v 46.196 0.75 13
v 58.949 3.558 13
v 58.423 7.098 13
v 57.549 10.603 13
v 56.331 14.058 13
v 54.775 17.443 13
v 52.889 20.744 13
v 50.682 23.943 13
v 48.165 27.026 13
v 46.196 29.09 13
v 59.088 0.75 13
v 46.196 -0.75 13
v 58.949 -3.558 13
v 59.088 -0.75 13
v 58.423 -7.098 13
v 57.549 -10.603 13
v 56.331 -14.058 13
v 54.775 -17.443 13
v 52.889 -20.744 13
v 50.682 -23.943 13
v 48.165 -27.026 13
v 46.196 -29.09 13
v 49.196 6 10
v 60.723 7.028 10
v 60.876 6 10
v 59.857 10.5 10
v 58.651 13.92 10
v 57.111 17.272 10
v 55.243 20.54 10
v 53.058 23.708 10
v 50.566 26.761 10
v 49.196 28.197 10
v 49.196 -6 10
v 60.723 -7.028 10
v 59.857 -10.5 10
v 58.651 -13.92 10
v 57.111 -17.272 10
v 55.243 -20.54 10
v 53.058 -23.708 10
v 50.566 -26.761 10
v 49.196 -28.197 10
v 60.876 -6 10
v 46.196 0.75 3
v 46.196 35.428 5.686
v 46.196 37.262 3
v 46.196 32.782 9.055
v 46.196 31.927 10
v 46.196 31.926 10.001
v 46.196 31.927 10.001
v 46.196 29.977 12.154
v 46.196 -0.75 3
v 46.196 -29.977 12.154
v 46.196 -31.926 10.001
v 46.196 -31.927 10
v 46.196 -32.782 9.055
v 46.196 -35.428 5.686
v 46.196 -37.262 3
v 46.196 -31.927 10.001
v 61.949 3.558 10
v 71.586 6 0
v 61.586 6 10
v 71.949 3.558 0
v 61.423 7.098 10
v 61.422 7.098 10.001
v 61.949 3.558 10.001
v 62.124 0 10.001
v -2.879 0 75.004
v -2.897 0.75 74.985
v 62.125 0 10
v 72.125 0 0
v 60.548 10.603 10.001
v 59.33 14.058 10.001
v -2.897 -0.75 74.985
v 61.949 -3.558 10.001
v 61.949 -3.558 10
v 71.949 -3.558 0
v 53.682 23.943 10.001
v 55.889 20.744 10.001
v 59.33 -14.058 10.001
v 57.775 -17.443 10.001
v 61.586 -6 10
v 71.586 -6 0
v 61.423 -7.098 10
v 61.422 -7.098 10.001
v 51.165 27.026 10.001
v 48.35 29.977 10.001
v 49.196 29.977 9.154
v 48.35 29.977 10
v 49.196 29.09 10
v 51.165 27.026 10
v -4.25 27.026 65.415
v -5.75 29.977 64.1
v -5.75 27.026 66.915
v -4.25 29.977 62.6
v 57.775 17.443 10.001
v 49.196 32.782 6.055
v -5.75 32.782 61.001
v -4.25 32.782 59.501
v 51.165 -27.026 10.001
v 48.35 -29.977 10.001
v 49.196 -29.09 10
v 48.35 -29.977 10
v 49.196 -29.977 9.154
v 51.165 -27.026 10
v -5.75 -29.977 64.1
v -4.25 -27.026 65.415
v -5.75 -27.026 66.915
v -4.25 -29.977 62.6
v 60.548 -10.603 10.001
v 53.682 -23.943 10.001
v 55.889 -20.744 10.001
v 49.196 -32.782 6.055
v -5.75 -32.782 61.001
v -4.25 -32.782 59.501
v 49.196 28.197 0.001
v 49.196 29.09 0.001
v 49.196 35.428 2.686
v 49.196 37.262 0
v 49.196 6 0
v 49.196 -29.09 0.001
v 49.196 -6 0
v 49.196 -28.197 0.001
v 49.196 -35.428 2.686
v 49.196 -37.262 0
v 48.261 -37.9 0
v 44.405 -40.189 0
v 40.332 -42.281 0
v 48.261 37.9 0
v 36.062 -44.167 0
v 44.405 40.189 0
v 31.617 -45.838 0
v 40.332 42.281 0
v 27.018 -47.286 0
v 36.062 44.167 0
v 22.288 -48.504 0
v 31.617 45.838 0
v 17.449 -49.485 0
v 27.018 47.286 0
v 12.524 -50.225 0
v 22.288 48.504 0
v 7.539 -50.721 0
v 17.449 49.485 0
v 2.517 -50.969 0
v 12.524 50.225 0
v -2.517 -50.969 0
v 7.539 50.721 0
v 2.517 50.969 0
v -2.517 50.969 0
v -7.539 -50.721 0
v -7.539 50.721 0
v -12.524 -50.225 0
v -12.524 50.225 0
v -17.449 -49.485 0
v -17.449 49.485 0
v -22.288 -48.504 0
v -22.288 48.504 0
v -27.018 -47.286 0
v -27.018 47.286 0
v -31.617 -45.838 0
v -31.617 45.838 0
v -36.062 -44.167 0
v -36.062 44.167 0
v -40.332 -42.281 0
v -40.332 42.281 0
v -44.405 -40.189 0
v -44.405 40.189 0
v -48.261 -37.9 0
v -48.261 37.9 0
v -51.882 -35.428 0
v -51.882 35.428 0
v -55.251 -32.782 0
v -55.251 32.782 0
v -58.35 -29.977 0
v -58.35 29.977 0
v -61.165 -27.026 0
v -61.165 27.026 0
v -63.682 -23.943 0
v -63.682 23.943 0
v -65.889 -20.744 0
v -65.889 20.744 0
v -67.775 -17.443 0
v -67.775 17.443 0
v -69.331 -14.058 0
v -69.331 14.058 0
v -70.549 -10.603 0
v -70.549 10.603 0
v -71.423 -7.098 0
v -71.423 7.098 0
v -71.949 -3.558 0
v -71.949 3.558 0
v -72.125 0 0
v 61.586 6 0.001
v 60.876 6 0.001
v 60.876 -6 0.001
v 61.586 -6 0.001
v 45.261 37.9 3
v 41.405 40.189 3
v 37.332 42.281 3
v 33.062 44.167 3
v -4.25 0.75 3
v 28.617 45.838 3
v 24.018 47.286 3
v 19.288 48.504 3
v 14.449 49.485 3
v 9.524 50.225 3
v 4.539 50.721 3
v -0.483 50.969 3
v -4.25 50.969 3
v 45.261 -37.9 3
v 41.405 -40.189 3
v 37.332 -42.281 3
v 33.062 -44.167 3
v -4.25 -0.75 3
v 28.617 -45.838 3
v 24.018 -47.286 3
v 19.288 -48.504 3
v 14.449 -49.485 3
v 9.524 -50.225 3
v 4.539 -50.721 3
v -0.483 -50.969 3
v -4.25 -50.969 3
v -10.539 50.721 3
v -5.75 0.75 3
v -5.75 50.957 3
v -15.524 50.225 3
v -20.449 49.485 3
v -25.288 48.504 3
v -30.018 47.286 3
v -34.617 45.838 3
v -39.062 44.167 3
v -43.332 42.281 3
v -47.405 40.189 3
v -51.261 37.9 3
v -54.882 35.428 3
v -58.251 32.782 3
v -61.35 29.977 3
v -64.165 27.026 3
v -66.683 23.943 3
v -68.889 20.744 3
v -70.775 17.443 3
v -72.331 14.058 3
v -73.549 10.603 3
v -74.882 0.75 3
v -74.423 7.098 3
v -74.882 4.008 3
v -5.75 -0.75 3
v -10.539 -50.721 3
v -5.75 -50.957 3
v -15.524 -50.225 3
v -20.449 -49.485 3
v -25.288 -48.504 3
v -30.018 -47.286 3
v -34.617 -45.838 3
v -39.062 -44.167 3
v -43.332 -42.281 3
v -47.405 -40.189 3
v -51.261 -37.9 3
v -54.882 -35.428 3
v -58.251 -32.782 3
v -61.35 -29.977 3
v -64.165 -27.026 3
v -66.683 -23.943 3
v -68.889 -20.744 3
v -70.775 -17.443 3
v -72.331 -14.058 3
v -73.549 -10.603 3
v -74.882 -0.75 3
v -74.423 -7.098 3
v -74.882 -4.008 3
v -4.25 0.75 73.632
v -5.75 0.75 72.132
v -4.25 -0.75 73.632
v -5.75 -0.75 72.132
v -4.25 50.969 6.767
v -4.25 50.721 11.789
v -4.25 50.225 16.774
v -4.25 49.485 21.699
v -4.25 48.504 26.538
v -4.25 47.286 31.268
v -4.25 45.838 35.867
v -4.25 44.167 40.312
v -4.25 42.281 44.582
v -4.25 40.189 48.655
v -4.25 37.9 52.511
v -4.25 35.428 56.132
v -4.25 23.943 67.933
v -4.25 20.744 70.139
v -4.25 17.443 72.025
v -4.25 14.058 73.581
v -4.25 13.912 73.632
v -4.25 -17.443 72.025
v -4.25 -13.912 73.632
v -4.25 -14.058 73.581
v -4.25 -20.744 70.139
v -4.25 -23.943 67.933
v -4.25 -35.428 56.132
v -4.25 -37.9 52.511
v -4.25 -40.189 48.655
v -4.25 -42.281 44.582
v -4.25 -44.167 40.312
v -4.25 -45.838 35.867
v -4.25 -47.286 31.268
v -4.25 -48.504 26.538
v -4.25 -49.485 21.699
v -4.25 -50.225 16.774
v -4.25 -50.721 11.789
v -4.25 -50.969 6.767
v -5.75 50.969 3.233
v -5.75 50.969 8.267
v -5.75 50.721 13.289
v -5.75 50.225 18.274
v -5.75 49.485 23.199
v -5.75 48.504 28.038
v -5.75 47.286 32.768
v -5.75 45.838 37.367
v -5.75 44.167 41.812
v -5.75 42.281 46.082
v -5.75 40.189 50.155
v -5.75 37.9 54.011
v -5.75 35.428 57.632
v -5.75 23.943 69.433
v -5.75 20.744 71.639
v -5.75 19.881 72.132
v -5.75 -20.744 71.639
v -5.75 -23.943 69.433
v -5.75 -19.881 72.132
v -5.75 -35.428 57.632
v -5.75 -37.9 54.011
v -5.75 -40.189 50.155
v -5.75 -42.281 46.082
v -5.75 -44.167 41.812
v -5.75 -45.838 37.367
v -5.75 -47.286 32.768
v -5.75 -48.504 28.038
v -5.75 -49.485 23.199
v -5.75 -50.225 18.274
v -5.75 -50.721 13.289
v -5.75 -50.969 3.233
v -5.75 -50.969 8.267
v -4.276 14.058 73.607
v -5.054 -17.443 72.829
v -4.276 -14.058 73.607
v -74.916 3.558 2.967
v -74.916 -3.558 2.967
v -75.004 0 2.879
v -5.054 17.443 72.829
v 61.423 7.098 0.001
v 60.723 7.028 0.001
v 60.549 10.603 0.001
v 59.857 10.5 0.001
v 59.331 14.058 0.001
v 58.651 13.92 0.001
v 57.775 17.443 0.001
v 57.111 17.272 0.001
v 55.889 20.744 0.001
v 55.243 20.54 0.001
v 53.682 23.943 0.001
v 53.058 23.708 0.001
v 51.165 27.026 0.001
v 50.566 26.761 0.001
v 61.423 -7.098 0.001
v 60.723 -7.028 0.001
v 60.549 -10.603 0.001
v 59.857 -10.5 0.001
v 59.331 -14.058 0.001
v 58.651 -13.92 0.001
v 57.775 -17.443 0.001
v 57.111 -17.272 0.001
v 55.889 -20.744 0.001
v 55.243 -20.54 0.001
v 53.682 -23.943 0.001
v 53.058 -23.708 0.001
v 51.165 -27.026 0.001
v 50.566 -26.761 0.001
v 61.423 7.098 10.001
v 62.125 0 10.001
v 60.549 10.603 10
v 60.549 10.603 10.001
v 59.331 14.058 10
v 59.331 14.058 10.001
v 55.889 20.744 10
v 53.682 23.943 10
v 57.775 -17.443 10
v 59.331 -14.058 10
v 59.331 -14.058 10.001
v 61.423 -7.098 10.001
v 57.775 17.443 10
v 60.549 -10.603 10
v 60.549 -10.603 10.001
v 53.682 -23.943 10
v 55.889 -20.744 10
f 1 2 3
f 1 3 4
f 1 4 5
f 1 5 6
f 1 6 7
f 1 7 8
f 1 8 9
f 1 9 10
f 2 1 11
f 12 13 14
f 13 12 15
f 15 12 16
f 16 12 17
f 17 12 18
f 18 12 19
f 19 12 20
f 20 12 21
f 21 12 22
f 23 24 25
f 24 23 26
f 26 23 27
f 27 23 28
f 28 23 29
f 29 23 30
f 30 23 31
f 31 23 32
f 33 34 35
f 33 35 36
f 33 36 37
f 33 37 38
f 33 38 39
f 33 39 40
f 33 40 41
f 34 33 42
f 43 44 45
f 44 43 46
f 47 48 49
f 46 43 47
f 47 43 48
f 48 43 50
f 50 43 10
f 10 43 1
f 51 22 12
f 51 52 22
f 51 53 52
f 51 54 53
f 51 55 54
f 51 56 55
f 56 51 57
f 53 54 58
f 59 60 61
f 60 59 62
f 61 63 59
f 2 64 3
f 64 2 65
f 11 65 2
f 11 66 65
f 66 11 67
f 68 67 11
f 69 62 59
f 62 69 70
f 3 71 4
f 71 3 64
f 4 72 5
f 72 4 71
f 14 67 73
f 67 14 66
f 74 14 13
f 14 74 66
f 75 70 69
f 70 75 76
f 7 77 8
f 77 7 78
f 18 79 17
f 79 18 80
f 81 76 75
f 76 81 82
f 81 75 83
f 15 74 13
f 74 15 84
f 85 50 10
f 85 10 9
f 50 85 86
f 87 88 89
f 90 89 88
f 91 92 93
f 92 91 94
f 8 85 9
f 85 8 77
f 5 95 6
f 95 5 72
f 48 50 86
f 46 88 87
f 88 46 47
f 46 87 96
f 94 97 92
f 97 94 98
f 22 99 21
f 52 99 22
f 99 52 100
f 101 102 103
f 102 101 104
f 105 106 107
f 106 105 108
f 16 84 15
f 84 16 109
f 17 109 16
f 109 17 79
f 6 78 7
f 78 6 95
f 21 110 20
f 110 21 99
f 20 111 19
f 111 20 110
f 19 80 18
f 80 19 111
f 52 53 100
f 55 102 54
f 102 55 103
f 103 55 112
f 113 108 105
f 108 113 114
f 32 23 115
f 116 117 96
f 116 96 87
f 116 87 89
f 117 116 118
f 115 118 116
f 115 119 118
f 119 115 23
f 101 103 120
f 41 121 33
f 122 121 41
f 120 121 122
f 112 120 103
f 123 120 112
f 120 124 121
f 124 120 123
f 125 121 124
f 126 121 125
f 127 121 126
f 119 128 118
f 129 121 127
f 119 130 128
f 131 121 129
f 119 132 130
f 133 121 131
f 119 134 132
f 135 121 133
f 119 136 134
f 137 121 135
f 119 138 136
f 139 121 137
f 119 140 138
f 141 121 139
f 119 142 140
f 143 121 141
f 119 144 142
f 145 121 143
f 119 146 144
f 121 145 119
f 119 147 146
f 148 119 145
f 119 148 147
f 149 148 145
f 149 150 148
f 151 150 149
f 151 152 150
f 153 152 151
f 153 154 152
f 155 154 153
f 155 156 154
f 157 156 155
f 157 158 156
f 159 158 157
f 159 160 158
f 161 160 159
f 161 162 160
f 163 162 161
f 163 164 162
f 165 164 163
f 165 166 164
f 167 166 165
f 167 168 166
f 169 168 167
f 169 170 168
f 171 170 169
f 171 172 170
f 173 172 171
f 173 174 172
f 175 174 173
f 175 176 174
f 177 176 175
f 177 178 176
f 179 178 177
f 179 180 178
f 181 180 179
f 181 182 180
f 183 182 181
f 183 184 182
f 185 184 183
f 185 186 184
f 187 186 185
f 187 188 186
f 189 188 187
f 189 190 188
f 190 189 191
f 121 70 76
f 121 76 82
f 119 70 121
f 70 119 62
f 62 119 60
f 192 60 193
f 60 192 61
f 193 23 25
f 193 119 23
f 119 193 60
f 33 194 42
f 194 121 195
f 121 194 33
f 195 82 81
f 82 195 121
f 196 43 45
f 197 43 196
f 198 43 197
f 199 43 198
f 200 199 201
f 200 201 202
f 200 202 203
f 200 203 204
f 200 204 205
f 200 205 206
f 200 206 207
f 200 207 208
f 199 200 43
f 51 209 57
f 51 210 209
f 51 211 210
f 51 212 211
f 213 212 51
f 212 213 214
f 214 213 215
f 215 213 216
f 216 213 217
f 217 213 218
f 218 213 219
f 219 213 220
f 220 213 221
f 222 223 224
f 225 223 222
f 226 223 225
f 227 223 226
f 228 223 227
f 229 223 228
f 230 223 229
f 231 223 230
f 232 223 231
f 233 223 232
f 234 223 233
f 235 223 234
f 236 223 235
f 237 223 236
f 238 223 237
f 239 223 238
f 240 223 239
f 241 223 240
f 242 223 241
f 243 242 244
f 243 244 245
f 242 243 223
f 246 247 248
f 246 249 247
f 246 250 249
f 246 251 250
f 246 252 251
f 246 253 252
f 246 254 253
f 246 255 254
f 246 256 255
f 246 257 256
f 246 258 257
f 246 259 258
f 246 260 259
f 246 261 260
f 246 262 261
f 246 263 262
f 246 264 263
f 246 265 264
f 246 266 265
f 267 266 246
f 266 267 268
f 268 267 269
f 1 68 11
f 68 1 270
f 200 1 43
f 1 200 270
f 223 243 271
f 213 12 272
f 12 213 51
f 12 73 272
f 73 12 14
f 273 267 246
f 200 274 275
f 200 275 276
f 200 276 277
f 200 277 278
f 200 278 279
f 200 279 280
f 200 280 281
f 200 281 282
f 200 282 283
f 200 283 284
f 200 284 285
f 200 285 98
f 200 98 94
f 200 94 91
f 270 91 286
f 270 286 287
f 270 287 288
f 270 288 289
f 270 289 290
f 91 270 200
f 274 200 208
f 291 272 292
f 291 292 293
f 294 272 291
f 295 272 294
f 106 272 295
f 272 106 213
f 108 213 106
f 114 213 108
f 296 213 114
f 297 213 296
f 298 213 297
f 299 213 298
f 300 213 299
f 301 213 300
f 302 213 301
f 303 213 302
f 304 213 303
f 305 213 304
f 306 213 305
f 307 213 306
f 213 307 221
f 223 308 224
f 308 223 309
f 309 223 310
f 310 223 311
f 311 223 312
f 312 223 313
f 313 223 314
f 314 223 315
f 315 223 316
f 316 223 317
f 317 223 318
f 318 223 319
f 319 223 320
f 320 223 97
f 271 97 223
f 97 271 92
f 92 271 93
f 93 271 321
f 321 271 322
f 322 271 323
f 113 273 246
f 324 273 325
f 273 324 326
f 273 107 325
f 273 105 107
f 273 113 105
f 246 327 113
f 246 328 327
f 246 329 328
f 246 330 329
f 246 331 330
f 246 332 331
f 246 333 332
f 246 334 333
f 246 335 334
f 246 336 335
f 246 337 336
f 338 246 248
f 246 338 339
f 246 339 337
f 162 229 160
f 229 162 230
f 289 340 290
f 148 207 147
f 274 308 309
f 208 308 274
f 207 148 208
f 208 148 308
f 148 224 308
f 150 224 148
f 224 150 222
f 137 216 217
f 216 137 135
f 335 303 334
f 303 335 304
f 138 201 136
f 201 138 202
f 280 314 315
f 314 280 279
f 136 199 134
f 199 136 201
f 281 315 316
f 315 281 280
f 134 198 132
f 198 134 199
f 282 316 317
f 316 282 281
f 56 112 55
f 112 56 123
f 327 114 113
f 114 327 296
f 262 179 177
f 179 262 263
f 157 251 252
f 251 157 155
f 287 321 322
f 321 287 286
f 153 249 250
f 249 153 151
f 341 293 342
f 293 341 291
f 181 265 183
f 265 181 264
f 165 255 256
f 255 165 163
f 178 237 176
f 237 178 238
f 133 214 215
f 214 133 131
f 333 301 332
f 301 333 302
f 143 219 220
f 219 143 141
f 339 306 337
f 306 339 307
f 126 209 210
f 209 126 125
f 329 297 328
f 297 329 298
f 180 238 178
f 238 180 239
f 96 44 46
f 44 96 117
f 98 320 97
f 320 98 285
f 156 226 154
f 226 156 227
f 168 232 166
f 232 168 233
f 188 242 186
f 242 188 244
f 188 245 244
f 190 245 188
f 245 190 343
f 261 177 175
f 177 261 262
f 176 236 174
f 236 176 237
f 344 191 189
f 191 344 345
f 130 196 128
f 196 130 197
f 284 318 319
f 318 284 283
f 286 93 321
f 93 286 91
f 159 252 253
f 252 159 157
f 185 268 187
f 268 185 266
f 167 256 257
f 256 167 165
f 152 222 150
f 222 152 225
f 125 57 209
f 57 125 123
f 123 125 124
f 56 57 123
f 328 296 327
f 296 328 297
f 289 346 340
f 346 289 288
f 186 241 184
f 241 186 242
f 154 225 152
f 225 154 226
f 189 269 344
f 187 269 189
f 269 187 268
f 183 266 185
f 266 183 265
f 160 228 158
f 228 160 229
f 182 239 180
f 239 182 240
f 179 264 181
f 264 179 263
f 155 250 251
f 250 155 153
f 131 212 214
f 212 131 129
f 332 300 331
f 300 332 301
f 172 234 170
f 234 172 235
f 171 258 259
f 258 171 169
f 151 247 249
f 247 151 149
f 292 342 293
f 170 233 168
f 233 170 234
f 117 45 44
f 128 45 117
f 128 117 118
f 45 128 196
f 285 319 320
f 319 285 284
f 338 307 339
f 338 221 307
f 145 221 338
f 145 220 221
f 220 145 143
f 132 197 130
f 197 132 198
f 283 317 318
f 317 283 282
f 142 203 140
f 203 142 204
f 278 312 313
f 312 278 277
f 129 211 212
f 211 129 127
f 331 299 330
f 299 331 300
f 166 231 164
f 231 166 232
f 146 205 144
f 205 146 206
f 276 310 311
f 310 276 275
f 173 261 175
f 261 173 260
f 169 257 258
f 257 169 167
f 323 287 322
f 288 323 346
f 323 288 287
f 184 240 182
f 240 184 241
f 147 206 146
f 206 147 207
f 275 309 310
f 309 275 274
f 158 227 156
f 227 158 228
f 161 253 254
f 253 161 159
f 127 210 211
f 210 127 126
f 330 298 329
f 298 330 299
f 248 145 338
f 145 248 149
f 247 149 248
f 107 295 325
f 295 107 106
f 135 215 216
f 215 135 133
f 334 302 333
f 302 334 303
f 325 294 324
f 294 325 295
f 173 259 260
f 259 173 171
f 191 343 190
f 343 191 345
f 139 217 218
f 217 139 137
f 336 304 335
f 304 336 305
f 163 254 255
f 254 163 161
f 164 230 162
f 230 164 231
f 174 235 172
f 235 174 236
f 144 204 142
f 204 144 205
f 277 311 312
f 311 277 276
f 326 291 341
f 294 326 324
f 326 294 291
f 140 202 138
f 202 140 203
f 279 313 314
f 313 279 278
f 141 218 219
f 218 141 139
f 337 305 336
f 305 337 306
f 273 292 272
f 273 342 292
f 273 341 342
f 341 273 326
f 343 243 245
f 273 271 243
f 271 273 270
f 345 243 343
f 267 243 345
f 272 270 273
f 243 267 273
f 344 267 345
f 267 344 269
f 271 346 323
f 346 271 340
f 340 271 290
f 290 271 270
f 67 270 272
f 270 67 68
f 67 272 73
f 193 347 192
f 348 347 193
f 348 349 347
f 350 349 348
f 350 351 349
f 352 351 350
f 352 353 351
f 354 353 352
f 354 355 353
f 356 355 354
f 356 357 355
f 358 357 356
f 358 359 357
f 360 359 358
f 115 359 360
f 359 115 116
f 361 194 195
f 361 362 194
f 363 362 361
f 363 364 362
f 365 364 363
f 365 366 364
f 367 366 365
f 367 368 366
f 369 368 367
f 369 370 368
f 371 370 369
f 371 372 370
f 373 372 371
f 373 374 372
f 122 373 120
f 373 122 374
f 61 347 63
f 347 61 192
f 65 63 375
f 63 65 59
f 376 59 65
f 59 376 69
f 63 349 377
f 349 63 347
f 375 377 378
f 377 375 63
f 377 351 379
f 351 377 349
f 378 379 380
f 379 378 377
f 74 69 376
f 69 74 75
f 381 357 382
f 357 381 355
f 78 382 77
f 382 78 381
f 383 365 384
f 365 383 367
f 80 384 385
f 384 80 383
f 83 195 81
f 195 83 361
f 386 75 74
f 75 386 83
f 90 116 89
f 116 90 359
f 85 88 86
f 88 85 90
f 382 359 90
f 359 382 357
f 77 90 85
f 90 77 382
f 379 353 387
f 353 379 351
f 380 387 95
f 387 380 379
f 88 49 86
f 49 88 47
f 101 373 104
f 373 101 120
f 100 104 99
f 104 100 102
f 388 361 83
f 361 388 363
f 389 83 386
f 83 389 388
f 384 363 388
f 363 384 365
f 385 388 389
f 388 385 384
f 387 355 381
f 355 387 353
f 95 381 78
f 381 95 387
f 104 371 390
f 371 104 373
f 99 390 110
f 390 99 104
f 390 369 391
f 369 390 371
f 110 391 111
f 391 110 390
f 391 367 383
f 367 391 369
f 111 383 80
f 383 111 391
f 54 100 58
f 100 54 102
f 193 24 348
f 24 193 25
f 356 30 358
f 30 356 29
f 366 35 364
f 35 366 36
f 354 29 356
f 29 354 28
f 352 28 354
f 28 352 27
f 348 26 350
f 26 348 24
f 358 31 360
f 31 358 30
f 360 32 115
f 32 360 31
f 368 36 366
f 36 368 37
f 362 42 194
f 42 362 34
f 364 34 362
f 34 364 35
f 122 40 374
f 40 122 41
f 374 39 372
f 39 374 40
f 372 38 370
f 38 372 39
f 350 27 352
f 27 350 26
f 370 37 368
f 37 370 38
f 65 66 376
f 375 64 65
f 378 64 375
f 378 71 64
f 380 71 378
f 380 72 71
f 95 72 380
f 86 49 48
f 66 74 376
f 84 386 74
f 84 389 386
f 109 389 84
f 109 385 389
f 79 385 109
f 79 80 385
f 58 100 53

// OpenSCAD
// file: parts.scad
include <definitions.scad>
elevation =  BASE_MIN_THICKNESS + PIPE_DIAMETER_INNER/2 + PIPE_MARGIN - WALL_THICKNESS;

module diagonal_end_rest_raw(thin=false) {
    translate([0, 0, elevation])
    rotate([0, 45, 0]) {
        // bottom-most wall, shorter to create rest
        translate([0, 0, -REST_HEIGHT/2])
        difference() {
            // wall, full surface, creating rest top
            thickness = thin ? 0.5 : WALL_THICKNESS;
            dz = REST_HEIGHT + thickness/2;
            translate([-dz, 0, dz])
            cube([PIPE_DIAMETER_INNER* S2 *2, PIPE_DIAMETER_INNER, thickness], true);

            translate([-REST_LENGTH-WALL_THICKNESS, 0, REST_HEIGHT])
            cube([PIPE_DIAMETER_INNER* S2 + REST_HEIGHT*S2, PIPE_DIAMETER_INNER+ATOM*2, REST_HEIGHT+WALL_THICKNESS], true);
        }
    }
}

module diagonal_end_rest(thin=false, recessed=false) {
    intersection() {
        radius = PIPE_DIAMETER_INNER/2 - (recessed ? 0.5 : 0);
        diagonal_end_rest_raw(thin);
        barrel(radius, 0, PIPE_HEIGHT);
    }
}

module diagonal_end_raw() {
    translate([0, 0, elevation])
    rotate([0, 45, 0]) {
        //
        // bottom-most wall, shorter to create rest
        //
        difference() {
            union() {
                translate([-REST_LENGTH, 0, 0])
                cube([PIPE_DIAMETER_INNER* S2 + REST_HEIGHT*S2, PIPE_DIAMETER_INNER, REST_HEIGHT], true);
                // cable grove
                cube([PIPE_DIAMETER_INNER* S2 + REST_HEIGHT*S2, PLUG_GROVE_WIDTH, REST_HEIGHT], true);   
            }
            translate([-REST_LENGTH-WALL_THICKNESS, 0, WALL_THICKNESS*1.5])
            cube([PIPE_DIAMETER_INNER* S2 + REST_HEIGHT*S2, PIPE_DIAMETER_INNER, REST_HEIGHT+WALL_THICKNESS], true);
        }

        // long foot
        h = PIPE_DIAMETER_INNER * 2;
        translate([0, 0, h/2 - REST_HEIGHT/2])
        cube ([PIPE_DIAMETER_INNER* S2*S2, WALL_THIN_THICKNESS, h], true);
        
        // short foot
        translate([0, 0, PIPE_DIAMETER_INNER/2 - REST_HEIGHT/2])
        cube ([WALL_THIN_THICKNESS, PIPE_DIAMETER_INNER, PIPE_DIAMETER_INNER], true);
    }
}

module diagonal_end(flat=false) {
    sink = flat ? -elevation + REST_HEIGHT / S2 : 0;
    rot = flat ? -45 : 0;
    
    rotate([0, rot, 0])
    translate([0, 0, sink])
    {
        diagonal_end_rest();
        intersection() {
            diagonal_end_raw();
            barrel(PIPE_DIAMETER_INNER/2, 0, PIPE_HEIGHT);
        }
    }
}

module diagonal_end_rest_border() {
    sink = -elevation + REST_HEIGHT / S2;
    rot = -45;
    
    rotate([0, rot, 0])
    translate([0, 0, sink]) {
        difference() {
            diagonal_end_rest(thin=true);
            diagonal_end_rest(thin=true, recessed=true);
        }
    }
}


module perpendicular_end_raw(recess) {
    translate([0, 0, CABLE_GROVE_HEIGHT/2 + PIPE_MARGIN/2])
    trapezoid ([PIPE_DIAMETER_OUTER, CABLE_GROVE_WIDTH-recess*2, CABLE_GROVE_HEIGHT + PIPE_MARGIN], true);

    translate([-CAVITY_SHORTAGE/2, 0, CAVITY_HEIGHT/2 + PIPE_MARGIN/2])
    trapezoid ([PIPE_DIAMETER_INNER-CAVITY_SHORTAGE, CAVITY_WIDTH-recess*2, CAVITY_HEIGHT + PIPE_MARGIN], true);

    if (!recess) {
        // marks
        translate([0, 0, PIPE_MARGIN/2])
        trapezoid ([PIPE_DIAMETER_OUTER, CABLE_GROVE_WIDTH+MARK_THICKNESS*2-recess*2, PIPE_MARGIN], true);

        translate([-CAVITY_SHORTAGE/2, 0, PIPE_MARGIN/2])
        trapezoid ([PIPE_DIAMETER_INNER-CAVITY_SHORTAGE, CAVITY_WIDTH+MARK_THICKNESS*2-recess*2, PIPE_MARGIN], true);
        
        // strut
        strut_height = WALL_THICKNESS;
        translate([0, 0, strut_height/2])
        cube ([WALL_THICKNESS, PIPE_DIAMETER_INNER, strut_height], true); 
    }
}

module perpendicular_end_stop() {
    translate([0, 0, -STOP_THICKNESS/2])
    cube ([PIPE_DIAMETER_OUTER, CABLE_GROVE_WIDTH+MARK_THICKNESS*2, STOP_THICKNESS], true);

    translate([-CAVITY_SHORTAGE/2 -PIPE_THICKNESS/2, 0, -STOP_THICKNESS/2])
    cube ([PIPE_DIAMETER_OUTER-PIPE_THICKNESS-CAVITY_SHORTAGE, CAVITY_WIDTH+MARK_THICKNESS*2, STOP_THICKNESS], true);
    
    translate([0, 0, -STOP_THICKNESS/2])
    cube ([WALL_THICKNESS, PIPE_DIAMETER_OUTER, STOP_THICKNESS], true); 
}

module perpendicular_end(flat=false) {
    translate([0, 0, flat ? STOP_THICKNESS : 0])
    {
        intersection() {
             difference(){
                perpendicular_end_raw(0);
                 translate([-WALL_THIN_THICKNESS, 0, -WALL_THIN_THICKNESS])
                perpendicular_end_raw(WALL_THIN_THICKNESS);
            }
            barrel(PIPE_DIAMETER_INNER/2, 0, PIPE_HEIGHT);
        }
        perpendicular_end_stop();
    }
}

perpendicular_end();
diagonal_end();
%barrel(PIPE_DIAMETER_OUTER/2, PIPE_DIAMETER_INNER/2, PIPE_HEIGHT);
// file: definitions.scad
S2 = sqrt(2);
ATOM = 0.001;

PIPE_THICKNESS = 2.5;
PIPE_DIAMETER_INNER = 102;
PIPE_DIAMETER_OUTER = PIPE_DIAMETER_INNER + 2 * PIPE_THICKNESS;
PIPE_MARGIN = 10;
PIPE_HEIGHT = 131; // please manually adjust

WALL_THICKNESS = 3;
WALL_THIN_THICKNESS = 1.5;
REST_HEIGHT = 10;
REST_LENGTH = 25;
BASE_MIN_THICKNESS = 25;
PLUG_GROVE_WIDTH = 12;
CABLE_GROVE_WIDTH = 7;
CABLE_GROVE_HEIGHT = 5;

CAVITY_WIDTH = 20;
CAVITY_SHORTAGE = 35;
CAVITY_HEIGHT = 30;
MARK_THICKNESS = 0.5;
STOP_THICKNESS = 2;

SUPPORT_THICKNESS = 0.5;

$fn = 90;

module barrel(outer_radius, inner_radius, height) {
    scale([1, 1, height])
    difference() {
        cylinder(r=outer_radius);
        if (inner_radius)
            translate([0, 0, -0.5]) scale([1, 1, 2])
            cylinder(r=inner_radius);
    }
}

module trapezoid(size, center) {
//    cube(size, center);
    x = size[0];
    y = size[1];
    z = size[2];
    d = z / 20; // conicity
    
    points = [
    [ 0,  0,  0 ],  //0
    [ x,  0,  0 ],  //1
    [ x,  y,  0 ],  //2
    [ 0,  y,  0 ],  //3
    [ 0,  d,  z ],  //4
    [ x,  d,  z ],  //5
    [ x,  y-d,  z ],  //6
    [ 0,  y-d,  z ]]; //7

    faces = [
    [0,1,2,3],  // bottom
    [4,5,1,0],  // front
    [7,6,5,4],  // top
    [5,6,2,1],  // right
    [6,7,3,2],  // back
    [7,4,0,3]]; // left

    if(center)
        translate([-x/2, -y/2, -z/2])
        polyhedron(points, faces);
    else
        polyhedron(points, faces);
}
// main file
// Density: 40%
// Quality: Draft

include <definitions.scad>
use <parts.scad>

diagonal_end(flat=true);

resize([0, 0, REST_HEIGHT])
intersection() {
    resize([0, 0, PIPE_DIAMETER_OUTER*100000])
    translate([0, 0, -REST_HEIGHT])
    diagonal_end_rest_border();
    cube([PIPE_DIAMETER_OUTER*2, PIPE_DIAMETER_OUTER, .001], true);
}
